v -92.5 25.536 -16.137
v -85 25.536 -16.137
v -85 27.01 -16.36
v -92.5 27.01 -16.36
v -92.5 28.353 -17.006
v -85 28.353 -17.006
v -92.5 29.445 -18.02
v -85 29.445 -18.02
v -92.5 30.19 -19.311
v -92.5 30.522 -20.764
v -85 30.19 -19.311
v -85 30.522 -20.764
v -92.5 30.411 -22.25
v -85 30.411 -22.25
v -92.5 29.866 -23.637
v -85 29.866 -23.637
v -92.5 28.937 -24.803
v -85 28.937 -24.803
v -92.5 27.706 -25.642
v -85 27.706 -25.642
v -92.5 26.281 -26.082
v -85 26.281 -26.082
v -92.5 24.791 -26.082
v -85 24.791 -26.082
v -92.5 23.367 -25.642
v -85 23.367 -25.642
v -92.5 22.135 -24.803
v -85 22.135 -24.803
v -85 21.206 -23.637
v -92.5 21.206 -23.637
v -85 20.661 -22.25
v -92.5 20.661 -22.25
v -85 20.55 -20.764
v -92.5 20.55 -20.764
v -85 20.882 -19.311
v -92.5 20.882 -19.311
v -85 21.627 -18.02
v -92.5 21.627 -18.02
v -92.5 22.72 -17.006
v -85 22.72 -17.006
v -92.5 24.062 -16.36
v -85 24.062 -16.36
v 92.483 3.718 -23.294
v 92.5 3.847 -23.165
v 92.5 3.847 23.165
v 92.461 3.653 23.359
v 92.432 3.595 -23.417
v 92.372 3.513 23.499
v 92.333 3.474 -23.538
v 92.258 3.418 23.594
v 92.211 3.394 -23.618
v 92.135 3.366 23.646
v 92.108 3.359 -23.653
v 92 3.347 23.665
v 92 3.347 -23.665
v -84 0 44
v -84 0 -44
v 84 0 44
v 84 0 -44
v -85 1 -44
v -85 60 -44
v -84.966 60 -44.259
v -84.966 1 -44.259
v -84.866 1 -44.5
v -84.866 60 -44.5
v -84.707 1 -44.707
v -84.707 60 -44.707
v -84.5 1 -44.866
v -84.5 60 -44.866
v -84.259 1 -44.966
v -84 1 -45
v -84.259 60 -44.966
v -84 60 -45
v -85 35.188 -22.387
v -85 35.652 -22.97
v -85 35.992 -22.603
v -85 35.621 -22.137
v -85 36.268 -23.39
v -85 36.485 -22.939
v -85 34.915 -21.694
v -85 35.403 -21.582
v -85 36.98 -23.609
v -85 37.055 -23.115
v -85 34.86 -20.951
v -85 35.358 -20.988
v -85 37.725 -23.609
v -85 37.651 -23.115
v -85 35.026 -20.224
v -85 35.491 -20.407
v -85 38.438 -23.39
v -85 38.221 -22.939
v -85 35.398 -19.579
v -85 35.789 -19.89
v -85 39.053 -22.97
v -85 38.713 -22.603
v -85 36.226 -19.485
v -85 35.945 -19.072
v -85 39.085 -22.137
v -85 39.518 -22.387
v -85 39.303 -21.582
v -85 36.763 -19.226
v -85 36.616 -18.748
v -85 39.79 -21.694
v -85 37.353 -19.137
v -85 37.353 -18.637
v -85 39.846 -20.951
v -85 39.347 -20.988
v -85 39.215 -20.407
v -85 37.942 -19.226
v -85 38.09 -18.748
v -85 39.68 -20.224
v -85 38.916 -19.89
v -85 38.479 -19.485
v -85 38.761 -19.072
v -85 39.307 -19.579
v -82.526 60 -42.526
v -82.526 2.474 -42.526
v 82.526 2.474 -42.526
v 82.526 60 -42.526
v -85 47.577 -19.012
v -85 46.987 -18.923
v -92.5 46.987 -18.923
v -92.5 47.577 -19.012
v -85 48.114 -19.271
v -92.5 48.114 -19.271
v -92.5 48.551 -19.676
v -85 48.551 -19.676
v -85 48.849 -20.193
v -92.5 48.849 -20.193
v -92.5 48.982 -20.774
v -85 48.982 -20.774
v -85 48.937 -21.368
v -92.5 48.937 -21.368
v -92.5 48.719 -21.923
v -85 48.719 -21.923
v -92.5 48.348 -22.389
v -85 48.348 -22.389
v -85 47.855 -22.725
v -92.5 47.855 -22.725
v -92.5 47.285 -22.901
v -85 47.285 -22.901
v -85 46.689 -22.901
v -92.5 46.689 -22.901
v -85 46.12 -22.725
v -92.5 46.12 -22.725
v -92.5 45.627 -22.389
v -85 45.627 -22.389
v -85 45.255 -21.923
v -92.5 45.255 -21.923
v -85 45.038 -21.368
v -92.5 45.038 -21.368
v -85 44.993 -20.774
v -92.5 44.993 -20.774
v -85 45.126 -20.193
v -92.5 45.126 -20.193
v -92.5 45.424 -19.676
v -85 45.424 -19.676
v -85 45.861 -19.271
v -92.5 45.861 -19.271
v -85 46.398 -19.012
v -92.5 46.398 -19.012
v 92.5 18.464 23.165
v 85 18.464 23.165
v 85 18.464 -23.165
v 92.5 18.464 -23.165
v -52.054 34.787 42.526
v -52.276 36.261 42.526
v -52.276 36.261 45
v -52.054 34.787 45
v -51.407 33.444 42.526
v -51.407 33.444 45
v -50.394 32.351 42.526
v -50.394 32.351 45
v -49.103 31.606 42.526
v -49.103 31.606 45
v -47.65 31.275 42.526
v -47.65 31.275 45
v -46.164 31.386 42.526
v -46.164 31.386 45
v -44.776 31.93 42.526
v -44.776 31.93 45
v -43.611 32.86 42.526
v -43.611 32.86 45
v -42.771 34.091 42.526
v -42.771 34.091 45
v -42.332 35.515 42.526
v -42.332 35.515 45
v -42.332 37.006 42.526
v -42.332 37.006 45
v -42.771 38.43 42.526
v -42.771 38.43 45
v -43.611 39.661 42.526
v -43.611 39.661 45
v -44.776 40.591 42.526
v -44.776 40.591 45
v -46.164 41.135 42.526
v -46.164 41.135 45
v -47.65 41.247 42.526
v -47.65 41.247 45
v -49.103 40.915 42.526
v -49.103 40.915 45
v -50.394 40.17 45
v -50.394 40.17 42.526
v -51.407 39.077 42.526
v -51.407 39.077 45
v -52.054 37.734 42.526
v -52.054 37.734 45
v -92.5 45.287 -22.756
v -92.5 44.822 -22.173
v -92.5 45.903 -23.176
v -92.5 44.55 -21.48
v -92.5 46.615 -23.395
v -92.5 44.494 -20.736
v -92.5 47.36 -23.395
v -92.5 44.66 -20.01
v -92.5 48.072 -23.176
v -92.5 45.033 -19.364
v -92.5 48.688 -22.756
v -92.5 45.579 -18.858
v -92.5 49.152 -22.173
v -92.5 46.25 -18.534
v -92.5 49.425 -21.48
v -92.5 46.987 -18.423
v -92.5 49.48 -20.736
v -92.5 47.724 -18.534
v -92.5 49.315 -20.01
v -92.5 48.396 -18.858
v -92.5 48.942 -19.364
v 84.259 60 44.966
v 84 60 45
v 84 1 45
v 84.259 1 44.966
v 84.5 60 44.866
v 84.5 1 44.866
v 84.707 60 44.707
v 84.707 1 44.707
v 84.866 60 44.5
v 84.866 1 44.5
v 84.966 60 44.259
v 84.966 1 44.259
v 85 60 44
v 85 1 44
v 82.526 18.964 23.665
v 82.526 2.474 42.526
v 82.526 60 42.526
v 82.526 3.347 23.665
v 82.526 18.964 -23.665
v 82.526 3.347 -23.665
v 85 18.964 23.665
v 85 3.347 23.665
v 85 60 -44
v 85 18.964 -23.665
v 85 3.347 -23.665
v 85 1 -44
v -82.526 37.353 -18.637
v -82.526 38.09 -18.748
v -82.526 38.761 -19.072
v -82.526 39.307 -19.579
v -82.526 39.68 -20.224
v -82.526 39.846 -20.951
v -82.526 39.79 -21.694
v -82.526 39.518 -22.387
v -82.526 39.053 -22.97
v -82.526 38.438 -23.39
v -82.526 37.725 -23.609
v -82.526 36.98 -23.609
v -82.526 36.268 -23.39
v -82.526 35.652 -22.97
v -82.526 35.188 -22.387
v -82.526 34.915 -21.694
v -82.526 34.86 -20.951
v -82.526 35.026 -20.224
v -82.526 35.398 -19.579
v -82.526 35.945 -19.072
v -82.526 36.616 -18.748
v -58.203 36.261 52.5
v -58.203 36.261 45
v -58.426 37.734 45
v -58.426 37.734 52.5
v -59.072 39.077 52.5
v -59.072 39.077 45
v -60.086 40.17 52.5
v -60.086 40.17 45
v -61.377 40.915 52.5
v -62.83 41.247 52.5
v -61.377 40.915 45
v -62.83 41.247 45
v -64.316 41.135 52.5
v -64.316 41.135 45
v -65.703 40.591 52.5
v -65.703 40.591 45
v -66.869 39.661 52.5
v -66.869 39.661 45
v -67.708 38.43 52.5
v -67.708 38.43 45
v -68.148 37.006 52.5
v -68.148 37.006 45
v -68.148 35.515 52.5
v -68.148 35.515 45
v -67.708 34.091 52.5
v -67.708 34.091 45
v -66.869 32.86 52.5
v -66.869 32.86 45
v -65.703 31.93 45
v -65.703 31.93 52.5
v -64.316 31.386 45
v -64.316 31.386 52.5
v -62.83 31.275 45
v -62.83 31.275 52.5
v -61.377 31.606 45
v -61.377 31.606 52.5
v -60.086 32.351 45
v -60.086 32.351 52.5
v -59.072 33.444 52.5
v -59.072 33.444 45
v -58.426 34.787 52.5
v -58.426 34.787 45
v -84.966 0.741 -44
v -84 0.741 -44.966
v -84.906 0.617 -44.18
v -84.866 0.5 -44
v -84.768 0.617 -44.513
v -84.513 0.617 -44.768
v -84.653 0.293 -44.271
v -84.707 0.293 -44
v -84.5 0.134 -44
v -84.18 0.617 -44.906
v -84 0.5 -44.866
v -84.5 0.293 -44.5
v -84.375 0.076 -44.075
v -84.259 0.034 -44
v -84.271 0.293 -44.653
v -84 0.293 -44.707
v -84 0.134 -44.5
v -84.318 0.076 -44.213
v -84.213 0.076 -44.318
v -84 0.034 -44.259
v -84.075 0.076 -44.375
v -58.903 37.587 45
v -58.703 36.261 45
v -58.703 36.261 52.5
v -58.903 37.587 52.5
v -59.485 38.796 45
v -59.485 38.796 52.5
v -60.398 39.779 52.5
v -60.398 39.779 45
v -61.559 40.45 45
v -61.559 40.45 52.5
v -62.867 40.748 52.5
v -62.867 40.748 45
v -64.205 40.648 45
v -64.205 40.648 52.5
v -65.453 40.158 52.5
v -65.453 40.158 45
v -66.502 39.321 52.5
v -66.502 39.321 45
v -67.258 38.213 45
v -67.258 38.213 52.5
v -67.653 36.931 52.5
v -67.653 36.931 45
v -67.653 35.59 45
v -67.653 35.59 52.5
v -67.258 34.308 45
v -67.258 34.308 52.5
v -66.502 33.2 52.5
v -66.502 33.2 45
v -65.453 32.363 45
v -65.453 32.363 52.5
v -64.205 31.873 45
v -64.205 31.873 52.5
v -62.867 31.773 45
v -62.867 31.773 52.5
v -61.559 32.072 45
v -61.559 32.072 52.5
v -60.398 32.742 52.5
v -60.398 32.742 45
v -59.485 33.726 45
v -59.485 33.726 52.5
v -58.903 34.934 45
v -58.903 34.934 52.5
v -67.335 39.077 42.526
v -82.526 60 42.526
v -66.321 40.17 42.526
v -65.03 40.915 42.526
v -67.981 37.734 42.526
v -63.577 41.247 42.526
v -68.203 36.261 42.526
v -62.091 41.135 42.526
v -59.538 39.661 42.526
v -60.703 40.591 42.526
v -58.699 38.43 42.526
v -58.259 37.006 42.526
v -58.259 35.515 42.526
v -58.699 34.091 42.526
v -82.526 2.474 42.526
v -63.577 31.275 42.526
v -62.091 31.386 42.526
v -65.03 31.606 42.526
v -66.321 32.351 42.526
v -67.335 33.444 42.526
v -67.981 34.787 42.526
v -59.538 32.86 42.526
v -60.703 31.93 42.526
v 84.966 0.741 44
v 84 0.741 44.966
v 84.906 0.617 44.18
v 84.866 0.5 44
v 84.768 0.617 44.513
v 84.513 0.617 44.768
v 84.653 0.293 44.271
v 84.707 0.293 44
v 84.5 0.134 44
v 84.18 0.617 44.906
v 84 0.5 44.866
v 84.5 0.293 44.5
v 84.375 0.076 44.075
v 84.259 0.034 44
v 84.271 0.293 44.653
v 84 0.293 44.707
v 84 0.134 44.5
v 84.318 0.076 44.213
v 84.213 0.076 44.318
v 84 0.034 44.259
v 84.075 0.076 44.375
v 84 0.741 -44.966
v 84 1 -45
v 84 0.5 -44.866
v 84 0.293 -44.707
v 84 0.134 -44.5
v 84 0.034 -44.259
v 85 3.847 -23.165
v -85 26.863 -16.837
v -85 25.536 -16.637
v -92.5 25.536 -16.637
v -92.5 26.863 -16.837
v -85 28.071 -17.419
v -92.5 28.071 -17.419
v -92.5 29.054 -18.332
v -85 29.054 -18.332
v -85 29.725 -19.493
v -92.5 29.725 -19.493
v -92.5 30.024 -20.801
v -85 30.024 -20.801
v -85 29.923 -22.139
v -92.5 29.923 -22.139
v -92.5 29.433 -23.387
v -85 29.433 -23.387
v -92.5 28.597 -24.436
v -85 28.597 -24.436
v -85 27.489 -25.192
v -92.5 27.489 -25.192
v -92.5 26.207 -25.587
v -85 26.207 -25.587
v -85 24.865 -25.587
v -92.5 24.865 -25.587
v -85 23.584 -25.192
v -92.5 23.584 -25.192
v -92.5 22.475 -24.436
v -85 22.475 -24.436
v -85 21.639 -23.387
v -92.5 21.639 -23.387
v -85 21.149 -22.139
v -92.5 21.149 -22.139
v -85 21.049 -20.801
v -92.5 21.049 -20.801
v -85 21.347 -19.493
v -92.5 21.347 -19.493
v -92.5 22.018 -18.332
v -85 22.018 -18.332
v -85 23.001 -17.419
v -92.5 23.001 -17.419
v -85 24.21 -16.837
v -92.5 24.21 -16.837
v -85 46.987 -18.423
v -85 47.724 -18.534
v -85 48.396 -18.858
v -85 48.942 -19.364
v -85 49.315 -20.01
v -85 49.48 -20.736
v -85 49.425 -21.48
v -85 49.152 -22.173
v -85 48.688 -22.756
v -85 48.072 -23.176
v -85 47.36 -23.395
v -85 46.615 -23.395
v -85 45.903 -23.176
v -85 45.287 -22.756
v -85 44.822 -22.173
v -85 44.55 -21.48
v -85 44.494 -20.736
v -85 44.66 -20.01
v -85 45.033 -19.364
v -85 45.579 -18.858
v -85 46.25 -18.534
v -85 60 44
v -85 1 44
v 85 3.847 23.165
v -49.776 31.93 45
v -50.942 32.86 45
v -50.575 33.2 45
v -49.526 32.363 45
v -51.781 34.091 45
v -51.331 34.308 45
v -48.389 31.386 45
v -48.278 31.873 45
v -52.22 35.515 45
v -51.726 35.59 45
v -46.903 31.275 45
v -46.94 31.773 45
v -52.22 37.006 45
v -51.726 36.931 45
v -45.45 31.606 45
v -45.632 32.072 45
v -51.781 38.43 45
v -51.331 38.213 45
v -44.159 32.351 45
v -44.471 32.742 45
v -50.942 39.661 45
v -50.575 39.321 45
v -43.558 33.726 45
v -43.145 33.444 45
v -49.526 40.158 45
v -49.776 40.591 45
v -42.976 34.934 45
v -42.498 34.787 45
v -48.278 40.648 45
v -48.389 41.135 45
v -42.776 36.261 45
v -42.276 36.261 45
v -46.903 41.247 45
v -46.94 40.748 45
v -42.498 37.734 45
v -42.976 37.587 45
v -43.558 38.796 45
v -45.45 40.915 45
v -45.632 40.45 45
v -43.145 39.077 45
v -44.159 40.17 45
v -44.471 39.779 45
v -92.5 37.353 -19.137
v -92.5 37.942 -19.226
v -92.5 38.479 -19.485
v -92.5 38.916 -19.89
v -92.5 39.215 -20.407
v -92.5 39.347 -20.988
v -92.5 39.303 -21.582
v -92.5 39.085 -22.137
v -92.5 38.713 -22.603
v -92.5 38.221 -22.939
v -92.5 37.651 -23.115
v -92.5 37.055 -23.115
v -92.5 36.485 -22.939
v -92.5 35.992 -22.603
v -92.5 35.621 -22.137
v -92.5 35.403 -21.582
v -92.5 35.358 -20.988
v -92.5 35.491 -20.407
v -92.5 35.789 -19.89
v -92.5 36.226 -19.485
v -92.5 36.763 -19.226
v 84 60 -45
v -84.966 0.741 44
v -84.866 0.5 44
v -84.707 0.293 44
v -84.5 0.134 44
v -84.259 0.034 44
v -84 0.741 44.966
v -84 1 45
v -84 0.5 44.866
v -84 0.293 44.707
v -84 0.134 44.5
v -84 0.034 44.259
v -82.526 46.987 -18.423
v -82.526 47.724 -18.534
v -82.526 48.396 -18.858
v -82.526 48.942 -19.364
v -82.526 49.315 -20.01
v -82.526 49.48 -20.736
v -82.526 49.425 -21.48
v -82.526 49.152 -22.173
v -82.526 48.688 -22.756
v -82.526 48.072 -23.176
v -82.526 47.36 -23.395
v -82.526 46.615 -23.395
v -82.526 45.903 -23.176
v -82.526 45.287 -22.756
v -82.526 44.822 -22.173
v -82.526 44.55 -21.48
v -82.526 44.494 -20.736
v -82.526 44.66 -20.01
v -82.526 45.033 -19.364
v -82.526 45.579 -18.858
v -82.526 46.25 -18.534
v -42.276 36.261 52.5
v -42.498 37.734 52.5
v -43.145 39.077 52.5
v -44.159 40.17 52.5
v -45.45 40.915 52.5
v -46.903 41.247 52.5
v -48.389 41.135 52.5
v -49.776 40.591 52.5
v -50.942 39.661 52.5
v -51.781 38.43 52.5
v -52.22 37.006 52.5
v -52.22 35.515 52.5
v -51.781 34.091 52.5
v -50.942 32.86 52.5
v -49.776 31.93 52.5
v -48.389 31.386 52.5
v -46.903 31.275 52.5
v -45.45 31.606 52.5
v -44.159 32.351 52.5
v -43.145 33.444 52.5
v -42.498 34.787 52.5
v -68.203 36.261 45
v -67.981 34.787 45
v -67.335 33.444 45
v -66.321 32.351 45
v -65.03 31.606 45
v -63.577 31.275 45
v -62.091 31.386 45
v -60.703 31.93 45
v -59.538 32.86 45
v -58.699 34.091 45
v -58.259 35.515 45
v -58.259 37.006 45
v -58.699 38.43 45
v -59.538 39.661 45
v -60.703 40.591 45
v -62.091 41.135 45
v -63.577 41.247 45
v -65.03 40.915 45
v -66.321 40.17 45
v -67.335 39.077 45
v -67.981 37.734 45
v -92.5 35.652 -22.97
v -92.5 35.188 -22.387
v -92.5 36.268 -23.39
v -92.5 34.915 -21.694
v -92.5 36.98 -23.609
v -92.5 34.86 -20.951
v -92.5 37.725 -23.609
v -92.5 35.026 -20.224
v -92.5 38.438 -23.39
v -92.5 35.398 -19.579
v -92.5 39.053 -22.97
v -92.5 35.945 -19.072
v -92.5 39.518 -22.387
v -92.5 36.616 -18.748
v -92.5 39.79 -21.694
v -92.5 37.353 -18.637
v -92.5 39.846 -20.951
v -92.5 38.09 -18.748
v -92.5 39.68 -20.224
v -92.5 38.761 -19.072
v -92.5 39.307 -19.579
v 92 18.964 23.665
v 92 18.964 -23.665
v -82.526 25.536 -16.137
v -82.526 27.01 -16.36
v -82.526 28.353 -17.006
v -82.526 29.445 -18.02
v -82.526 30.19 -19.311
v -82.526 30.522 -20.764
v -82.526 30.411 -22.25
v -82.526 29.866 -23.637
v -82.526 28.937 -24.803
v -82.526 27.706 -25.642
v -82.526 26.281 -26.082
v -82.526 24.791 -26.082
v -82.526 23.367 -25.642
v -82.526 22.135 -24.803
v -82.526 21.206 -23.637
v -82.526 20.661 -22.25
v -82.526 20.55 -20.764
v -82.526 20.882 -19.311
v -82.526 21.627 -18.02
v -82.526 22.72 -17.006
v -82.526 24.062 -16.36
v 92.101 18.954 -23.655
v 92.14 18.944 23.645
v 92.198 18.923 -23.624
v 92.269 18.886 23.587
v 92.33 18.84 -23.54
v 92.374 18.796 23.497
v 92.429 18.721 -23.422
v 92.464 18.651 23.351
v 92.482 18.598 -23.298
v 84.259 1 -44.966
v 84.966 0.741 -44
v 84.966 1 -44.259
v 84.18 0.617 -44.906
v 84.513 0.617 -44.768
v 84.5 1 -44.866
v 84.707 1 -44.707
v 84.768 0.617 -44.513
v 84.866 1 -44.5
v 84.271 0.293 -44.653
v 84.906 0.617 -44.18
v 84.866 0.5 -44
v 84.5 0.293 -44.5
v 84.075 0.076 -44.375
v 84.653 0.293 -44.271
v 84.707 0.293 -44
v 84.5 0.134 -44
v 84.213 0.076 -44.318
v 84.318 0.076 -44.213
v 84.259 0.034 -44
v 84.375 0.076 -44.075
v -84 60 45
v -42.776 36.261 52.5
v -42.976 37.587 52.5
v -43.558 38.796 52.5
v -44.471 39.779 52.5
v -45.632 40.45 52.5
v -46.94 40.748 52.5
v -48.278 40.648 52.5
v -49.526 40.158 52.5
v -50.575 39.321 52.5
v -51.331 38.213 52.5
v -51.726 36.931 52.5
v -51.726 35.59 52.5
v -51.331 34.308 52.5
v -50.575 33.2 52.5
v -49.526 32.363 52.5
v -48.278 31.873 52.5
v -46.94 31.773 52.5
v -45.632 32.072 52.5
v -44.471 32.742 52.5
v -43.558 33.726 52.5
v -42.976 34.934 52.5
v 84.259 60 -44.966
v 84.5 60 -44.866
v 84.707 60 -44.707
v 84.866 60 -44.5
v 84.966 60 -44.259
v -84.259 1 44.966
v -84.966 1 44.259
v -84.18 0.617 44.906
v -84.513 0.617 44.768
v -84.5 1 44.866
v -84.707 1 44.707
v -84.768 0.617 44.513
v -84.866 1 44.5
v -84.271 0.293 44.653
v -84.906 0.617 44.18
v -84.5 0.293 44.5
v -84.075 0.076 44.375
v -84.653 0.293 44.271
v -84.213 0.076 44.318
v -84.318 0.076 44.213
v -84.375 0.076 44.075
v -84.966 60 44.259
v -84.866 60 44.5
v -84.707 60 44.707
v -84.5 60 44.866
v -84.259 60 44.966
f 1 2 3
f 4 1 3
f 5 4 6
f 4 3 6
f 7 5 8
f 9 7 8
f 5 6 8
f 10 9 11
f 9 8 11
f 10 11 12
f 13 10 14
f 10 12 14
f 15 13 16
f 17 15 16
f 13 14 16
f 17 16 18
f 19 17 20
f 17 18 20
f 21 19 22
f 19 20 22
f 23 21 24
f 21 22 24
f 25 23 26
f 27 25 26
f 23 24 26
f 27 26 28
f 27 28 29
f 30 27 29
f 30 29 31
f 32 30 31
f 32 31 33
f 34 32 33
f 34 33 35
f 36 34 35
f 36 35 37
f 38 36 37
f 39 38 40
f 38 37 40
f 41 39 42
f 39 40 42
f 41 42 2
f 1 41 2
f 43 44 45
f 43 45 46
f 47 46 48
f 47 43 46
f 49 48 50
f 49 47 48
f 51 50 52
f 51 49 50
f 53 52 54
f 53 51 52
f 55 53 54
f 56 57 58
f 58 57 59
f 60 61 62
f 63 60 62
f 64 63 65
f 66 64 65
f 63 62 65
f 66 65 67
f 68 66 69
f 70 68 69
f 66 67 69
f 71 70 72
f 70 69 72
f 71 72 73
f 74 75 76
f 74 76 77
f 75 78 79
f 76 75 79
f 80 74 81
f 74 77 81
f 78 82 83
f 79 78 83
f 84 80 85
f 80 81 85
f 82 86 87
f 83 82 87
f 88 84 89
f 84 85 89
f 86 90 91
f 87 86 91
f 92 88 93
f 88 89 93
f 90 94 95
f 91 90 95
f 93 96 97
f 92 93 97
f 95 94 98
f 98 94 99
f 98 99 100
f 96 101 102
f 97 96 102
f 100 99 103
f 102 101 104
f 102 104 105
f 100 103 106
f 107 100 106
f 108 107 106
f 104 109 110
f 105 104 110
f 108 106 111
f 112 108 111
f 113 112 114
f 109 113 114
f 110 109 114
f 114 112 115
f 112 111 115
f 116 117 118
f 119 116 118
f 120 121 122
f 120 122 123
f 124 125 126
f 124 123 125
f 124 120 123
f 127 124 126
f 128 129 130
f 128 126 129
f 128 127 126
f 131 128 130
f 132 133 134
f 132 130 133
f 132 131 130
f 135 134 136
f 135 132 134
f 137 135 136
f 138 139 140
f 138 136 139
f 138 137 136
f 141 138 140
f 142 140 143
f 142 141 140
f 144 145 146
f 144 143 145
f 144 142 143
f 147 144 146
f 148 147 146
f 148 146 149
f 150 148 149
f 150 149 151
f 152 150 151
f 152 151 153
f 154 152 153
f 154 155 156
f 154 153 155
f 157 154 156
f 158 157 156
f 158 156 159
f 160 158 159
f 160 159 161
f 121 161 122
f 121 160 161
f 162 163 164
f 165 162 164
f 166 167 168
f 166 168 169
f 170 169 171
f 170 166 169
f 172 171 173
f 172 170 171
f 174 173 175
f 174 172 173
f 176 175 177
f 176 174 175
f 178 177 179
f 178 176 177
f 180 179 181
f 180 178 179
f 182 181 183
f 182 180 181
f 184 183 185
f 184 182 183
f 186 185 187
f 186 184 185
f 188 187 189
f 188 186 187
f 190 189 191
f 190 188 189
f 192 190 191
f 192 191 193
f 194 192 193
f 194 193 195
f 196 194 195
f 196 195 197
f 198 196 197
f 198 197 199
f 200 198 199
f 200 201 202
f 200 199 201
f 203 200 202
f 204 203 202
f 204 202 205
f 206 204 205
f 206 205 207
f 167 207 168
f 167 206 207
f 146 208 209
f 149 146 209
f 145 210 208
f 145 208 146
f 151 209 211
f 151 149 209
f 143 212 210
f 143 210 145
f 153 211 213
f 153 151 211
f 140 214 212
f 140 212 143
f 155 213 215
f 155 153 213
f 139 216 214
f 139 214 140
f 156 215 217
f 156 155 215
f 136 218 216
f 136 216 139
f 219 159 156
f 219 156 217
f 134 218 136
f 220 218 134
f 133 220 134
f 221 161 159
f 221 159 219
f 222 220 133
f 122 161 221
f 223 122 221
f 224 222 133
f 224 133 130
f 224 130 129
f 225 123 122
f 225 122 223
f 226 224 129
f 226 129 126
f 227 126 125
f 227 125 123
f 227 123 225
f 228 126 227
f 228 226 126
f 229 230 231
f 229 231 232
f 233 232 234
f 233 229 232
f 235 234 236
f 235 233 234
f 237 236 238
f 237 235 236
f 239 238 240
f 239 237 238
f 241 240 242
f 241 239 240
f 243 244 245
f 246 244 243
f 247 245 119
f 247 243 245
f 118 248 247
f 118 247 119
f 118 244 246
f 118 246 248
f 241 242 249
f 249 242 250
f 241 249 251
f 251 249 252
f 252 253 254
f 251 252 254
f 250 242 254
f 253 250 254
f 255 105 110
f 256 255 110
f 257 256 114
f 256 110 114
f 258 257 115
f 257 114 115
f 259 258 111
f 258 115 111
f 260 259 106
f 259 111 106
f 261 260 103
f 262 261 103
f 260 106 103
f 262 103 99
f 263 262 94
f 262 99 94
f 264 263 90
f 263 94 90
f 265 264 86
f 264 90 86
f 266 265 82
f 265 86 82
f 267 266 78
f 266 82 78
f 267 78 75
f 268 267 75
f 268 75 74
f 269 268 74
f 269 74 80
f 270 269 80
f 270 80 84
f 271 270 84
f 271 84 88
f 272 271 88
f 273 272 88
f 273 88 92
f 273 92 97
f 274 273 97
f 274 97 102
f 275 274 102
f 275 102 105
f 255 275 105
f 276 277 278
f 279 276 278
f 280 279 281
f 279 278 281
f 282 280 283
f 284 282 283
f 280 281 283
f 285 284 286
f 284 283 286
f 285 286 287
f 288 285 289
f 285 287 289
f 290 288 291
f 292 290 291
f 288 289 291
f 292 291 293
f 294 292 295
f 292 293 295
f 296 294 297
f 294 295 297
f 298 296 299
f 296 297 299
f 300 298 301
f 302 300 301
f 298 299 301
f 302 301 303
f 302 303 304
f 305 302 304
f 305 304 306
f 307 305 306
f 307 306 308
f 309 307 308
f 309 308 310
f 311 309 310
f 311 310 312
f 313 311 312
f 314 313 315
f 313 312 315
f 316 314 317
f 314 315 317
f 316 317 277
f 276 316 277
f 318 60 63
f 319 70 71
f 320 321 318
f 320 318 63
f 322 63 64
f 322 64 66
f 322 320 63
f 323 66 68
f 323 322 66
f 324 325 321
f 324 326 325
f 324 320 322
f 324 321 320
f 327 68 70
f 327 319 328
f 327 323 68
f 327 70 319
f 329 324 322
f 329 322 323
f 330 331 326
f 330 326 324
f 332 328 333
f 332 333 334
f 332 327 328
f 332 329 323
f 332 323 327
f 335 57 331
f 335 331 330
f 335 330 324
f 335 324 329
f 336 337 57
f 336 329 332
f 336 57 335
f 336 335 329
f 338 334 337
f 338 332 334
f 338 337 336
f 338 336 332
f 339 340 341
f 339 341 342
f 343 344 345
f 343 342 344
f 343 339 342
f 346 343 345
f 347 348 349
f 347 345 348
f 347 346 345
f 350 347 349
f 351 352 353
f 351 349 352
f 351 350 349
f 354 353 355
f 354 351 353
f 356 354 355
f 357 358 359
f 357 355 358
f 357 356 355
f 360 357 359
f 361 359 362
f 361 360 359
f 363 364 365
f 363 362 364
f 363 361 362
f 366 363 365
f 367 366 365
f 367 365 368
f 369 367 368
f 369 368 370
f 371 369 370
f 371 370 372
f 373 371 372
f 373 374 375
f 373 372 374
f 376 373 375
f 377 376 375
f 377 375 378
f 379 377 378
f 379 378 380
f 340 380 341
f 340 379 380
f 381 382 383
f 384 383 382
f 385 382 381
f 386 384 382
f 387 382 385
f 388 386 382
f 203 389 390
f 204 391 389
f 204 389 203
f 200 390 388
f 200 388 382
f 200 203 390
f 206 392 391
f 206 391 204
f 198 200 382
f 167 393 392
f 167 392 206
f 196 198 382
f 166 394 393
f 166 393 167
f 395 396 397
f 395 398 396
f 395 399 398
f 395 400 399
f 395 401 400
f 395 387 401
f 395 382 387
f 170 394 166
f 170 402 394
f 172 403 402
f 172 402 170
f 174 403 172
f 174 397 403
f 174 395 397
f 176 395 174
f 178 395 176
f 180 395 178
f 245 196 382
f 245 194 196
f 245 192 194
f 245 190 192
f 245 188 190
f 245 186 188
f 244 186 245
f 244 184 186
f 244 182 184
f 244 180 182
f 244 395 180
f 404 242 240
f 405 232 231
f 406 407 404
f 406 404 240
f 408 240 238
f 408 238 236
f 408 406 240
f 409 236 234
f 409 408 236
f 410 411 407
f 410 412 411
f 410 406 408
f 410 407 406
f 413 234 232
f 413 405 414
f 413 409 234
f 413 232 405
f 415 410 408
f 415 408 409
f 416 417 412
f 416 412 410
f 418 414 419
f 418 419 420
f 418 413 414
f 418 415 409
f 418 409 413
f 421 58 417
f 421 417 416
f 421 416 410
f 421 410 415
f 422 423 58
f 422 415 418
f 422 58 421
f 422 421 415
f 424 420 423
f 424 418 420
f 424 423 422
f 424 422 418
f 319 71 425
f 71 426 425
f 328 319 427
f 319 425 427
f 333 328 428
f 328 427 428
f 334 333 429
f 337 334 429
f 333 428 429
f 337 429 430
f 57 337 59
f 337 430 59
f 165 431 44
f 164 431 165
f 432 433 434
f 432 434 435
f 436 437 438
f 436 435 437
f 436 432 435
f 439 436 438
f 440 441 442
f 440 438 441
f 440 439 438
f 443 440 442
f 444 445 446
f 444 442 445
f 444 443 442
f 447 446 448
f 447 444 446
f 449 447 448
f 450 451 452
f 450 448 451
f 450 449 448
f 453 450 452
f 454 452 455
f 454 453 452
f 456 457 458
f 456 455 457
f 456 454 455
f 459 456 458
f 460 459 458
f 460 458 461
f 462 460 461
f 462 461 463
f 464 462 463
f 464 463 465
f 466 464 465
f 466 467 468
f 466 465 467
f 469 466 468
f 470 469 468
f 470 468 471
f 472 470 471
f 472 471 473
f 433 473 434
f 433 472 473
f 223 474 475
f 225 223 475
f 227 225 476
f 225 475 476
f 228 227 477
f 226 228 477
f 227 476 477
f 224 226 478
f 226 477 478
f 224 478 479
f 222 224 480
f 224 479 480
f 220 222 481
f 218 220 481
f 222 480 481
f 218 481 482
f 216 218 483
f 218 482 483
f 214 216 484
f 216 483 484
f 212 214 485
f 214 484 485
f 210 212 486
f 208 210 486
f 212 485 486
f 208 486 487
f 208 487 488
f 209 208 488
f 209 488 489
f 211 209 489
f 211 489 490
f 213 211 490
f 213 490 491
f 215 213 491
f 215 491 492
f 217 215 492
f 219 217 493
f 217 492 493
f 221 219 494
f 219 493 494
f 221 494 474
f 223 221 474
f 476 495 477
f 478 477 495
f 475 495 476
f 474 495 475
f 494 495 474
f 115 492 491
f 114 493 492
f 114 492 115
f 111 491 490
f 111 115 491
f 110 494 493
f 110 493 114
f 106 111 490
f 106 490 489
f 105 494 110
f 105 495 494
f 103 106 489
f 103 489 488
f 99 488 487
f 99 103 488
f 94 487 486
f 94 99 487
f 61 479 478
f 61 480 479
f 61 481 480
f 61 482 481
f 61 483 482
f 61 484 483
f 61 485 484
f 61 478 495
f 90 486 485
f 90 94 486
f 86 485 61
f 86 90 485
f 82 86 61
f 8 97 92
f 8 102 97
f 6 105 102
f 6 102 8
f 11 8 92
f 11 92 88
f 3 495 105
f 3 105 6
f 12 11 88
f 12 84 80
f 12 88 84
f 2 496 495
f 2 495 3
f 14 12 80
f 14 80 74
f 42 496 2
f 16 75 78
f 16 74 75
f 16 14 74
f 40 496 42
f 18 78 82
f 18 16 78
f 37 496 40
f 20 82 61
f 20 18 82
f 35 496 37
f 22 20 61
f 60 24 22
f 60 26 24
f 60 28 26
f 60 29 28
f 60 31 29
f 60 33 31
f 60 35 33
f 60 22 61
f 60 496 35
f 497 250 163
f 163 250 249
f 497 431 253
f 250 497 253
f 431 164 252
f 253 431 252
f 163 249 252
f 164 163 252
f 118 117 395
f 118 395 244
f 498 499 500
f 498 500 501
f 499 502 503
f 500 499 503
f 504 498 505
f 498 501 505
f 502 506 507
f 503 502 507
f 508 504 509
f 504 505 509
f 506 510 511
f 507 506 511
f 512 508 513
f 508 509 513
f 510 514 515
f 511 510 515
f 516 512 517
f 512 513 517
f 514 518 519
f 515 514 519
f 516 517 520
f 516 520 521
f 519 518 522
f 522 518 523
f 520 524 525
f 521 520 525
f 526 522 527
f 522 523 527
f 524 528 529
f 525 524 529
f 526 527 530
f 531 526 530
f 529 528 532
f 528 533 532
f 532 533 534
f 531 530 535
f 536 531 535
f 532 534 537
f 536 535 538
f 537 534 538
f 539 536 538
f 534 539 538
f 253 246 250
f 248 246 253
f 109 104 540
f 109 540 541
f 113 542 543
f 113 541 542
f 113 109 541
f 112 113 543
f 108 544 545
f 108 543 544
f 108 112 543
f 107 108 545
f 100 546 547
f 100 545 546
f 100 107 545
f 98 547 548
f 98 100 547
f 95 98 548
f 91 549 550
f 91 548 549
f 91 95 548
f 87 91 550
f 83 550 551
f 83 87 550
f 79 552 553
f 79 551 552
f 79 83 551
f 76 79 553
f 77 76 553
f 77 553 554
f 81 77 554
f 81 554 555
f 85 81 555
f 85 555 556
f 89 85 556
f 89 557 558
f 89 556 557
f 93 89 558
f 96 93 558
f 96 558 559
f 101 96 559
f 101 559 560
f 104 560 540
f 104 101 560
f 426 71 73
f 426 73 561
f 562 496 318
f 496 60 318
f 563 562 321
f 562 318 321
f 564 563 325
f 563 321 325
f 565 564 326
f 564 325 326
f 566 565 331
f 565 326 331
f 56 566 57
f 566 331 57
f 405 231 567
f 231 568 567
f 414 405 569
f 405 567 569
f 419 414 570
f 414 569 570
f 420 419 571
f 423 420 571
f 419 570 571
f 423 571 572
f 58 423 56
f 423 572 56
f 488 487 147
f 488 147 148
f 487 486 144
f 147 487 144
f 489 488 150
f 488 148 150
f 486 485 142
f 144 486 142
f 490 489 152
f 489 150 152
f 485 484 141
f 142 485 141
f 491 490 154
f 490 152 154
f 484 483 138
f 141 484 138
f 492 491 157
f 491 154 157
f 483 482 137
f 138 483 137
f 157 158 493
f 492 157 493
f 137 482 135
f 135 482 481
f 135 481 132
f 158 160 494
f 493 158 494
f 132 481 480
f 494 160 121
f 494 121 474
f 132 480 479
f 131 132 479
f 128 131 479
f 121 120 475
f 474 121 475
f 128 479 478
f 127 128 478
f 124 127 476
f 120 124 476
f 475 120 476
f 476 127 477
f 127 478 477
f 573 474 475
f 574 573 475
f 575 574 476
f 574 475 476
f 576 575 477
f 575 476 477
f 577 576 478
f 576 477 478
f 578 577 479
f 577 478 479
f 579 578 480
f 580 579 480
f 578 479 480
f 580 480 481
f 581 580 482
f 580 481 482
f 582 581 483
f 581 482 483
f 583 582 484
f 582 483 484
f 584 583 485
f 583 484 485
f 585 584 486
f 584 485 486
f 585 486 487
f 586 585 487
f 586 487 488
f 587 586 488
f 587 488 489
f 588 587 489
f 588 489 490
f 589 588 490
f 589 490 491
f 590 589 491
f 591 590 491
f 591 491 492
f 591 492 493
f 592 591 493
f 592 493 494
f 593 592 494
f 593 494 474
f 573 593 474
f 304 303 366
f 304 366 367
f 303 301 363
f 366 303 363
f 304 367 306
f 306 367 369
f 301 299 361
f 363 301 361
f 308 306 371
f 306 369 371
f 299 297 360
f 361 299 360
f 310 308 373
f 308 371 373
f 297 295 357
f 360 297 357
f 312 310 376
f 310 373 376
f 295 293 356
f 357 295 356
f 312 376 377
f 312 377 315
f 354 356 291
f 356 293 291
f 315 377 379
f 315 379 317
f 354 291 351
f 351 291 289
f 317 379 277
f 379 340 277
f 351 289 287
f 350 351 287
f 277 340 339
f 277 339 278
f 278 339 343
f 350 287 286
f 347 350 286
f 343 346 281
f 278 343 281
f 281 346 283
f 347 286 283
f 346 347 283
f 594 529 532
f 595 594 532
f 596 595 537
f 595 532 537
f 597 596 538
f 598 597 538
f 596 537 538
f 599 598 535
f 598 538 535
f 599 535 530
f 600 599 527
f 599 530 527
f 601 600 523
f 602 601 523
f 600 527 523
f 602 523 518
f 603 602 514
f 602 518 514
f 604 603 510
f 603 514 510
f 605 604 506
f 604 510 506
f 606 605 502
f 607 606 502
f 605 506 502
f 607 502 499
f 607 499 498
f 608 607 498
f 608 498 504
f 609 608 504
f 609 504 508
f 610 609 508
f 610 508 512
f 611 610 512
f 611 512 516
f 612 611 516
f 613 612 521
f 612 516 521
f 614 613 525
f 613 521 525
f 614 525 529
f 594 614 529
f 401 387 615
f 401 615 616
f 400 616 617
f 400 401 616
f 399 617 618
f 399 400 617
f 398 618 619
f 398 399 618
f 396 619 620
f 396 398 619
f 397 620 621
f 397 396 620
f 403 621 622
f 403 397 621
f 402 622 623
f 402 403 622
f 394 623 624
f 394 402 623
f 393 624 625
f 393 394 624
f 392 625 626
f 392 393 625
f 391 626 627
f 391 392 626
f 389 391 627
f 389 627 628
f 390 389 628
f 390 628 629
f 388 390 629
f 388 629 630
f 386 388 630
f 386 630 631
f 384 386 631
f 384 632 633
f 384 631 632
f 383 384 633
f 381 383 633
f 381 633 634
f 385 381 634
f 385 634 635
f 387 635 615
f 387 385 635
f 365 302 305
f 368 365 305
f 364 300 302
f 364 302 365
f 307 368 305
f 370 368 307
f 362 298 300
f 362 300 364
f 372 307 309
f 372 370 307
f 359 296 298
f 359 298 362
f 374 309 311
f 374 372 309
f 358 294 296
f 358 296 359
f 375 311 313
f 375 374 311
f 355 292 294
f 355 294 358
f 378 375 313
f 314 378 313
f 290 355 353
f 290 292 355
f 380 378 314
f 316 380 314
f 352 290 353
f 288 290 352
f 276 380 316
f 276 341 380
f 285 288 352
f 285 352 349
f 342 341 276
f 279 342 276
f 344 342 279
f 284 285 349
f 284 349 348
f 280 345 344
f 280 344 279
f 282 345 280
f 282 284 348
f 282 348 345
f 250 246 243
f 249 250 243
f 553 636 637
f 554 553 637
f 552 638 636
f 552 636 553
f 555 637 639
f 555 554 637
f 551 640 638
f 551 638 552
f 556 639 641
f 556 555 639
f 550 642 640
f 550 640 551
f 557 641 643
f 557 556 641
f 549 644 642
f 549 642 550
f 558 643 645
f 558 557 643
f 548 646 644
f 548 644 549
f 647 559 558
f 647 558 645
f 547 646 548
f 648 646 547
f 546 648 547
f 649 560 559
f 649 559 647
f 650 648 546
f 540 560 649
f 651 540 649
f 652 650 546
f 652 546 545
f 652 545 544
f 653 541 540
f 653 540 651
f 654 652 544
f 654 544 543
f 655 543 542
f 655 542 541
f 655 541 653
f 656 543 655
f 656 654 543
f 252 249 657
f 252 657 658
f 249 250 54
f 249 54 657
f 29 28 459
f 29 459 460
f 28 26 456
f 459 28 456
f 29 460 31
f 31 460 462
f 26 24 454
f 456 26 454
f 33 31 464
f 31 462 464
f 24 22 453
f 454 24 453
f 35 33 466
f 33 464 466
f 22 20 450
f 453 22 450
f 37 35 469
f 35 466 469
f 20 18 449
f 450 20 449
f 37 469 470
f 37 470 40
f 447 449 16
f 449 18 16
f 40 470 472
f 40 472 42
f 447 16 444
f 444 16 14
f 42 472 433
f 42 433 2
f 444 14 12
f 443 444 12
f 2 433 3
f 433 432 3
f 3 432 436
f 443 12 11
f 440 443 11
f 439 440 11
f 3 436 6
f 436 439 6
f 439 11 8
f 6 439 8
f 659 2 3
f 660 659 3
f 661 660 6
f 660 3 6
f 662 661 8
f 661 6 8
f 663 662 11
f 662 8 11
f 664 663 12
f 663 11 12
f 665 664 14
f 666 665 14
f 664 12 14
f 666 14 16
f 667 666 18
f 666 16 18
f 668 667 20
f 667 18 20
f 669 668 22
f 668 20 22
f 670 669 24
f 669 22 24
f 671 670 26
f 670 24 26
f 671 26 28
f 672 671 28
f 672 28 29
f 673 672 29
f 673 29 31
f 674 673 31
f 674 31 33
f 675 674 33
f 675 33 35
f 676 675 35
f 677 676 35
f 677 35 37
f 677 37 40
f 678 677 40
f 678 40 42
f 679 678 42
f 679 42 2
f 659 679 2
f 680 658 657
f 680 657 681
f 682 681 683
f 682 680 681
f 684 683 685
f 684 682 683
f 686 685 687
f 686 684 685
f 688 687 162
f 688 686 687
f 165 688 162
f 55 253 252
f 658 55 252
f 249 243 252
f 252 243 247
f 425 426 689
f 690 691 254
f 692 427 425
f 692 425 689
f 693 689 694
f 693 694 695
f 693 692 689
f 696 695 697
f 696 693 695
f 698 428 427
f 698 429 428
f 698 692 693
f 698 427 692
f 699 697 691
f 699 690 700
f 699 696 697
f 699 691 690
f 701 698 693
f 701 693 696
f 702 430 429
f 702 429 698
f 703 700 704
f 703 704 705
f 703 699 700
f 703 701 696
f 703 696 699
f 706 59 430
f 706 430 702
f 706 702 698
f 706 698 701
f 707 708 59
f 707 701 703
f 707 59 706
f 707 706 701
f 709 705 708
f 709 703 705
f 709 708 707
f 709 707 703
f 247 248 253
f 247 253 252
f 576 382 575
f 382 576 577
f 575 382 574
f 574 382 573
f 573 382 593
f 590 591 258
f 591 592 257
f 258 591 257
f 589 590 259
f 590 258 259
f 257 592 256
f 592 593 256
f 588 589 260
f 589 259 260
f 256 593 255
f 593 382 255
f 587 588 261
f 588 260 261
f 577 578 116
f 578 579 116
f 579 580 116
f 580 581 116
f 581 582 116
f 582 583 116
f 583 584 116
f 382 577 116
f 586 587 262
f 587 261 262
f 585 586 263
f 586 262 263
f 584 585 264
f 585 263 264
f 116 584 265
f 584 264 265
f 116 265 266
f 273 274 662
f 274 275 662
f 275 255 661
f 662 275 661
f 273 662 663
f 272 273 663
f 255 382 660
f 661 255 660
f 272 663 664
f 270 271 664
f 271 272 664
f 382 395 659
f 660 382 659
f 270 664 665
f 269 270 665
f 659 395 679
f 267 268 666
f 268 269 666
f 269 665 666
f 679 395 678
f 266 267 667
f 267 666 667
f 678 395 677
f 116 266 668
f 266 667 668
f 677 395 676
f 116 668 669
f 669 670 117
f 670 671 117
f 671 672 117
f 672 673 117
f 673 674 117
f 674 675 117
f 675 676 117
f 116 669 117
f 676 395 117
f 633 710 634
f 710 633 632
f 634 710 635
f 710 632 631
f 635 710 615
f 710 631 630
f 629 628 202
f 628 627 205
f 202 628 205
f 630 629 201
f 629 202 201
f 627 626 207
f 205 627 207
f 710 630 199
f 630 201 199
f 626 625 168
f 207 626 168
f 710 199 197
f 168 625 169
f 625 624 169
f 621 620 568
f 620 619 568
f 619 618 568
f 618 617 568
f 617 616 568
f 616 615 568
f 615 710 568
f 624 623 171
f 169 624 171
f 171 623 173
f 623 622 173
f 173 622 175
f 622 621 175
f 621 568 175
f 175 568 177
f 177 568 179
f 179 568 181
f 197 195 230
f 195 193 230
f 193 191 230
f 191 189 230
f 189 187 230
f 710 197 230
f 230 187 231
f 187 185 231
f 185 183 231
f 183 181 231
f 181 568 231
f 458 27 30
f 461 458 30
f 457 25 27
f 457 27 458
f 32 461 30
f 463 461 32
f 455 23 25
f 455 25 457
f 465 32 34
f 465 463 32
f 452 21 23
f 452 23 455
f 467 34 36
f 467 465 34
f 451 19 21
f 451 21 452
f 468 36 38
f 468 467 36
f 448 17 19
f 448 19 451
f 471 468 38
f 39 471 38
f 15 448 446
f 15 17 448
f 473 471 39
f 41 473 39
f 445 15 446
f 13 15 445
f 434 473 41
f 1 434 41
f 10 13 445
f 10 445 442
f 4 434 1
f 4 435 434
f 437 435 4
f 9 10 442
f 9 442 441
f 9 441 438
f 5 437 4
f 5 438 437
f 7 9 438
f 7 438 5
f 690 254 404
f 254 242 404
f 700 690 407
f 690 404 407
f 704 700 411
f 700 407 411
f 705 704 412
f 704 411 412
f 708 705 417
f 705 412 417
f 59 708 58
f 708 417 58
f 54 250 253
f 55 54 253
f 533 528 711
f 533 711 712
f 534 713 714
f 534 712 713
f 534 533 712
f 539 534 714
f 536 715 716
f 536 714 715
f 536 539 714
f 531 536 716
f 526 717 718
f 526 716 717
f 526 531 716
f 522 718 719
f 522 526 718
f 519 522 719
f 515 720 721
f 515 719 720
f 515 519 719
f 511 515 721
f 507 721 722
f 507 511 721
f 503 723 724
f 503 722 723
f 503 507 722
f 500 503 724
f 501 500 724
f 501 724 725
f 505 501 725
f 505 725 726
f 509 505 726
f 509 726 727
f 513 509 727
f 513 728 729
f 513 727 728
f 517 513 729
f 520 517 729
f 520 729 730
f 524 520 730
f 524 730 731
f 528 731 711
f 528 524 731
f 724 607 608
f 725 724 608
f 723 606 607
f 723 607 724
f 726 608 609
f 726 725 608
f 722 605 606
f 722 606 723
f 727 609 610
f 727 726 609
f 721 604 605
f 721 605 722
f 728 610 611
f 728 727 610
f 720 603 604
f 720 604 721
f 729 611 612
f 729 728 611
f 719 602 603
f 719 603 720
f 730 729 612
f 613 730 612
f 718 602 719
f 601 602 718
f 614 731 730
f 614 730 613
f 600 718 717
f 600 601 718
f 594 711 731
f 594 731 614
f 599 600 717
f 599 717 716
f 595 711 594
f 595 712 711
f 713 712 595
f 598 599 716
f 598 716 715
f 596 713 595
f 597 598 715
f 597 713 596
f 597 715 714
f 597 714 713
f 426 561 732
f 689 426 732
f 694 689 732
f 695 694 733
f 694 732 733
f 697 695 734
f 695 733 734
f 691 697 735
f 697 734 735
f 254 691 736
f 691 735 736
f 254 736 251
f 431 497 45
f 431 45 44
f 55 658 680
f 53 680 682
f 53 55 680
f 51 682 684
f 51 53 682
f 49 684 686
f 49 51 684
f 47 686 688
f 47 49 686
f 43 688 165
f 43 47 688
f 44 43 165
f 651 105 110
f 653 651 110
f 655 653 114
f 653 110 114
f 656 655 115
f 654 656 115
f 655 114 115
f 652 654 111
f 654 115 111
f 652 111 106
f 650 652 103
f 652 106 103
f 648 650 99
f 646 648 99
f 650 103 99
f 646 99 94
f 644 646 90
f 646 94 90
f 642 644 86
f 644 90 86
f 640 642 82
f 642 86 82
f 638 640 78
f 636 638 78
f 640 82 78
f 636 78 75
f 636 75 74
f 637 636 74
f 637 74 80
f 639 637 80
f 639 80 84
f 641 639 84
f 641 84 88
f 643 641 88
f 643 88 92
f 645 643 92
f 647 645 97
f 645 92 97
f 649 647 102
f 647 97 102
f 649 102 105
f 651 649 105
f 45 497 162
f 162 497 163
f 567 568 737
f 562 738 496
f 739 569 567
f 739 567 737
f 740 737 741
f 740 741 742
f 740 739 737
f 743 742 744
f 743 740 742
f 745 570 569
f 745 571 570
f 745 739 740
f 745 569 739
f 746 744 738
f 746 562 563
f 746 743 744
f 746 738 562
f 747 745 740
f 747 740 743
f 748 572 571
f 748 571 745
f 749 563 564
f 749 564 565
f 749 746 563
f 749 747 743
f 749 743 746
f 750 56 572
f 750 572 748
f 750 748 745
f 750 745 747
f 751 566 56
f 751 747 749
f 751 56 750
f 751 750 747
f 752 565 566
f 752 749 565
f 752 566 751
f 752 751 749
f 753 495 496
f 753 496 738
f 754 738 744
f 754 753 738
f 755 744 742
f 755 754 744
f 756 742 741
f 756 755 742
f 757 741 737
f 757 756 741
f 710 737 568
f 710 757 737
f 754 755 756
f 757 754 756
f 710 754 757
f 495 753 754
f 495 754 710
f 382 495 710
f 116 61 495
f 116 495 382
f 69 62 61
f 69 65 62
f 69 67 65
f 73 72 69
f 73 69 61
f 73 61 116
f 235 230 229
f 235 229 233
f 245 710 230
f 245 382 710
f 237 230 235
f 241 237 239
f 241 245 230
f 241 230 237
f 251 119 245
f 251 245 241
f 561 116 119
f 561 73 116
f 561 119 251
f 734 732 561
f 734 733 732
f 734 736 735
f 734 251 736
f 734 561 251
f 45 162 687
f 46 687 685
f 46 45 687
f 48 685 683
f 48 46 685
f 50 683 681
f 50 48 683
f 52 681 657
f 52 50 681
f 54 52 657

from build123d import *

# Parameters (mm, degrees)
SKETCH1_W             = 170
SKETCH1_H             = 90
BOSS_EXTRUDE2_DEPTH   = 60
SHELL2_T              = -2.473839036
SKETCH4_W             = 47.329999632
SKETCH4_H             = 15.617306276
CUT_EXTRUDE3_DEPTH    = 95
SKETCH5_R             = 5
CUT_EXTRUDE4_DEPTH    = 82.49790304
SKETCH11_R            = 2.5
CUT_EXTRUDE5_DEPTH    = 10
SKETCH12_R            = 2.5
CUT_EXTRUDE6_DEPTH    = 10
SKETCH13_R            = 5
CUT_EXTRUDE7_DEPTH    = 10
SKETCH18_R            = 2.5
BOSS_EXTRUDE4_DEPTH   = 7.5
SHELL5_T              = -0.5
SKETCH19_R            = 2.5
BOSS_EXTRUDE5_DEPTH   = 7.5
SHELL6_T              = -0.5
SKETCH20_R            = 5
BOSS_EXTRUDE6_DEPTH   = 7.5
SHELL7_T              = -0.5
SKETCH21_R            = 5
BOSS_EXTRUDE7_DEPTH   = 7.5
BOSS_EXTRUDE7_2_DEPTH = 7.5
SHELL8_T              = -0.5
SHELL9_T              = -0.5
SKETCH23_W            = 47.329999632
SKETCH23_H            = 15.617306276
BOSS_EXTRUDE8_DEPTH   = 7.5
SHELL10_T             = -0.5
FILLET1_START         = 2
FILLET1_DEPTH         = 18
FILLET1_START_2       = -25
FILLET1_2_DEPTH       = 50
FILLET3_R             = 1
FILLET4_R             = 1


with BuildPart() as part:
    # Sketch1 → Boss-Extrude2 (new body)
    with BuildSketch(Plane(origin=(0, 0, 0), x_dir=(1, 0, 0), z_dir=(0, 1, 0))):
        Rectangle(SKETCH1_W, SKETCH1_H)
    extrude(amount=BOSS_EXTRUDE2_DEPTH)

    # Shell2
    shell2_openings = [part.faces().sort_by_distance(p)[0] for p in [
        (0, 60, 0),
    ]]
    offset(amount=SHELL2_T, openings=shell2_openings, kind=Kind.INTERSECTION)

    # Sketch4 → Cut-Extrude3 (cut)
    with BuildSketch(Plane(origin=(0, 0, 0), x_dir=(0, 0, -1), z_dir=(1, 0, 0))):
        with Locations((0, 11.155648294)):
            Rectangle(SKETCH4_W, SKETCH4_H)
    extrude(amount=CUT_EXTRUDE3_DEPTH, mode=Mode.SUBTRACT)

    # Sketch5 → Cut-Extrude4 (cut)
    with BuildSketch(Plane.XY):
        with Locations(Location((-63.203440073, 36.260575633, 0), (0, 0, 180))):
            Circle(SKETCH5_R)
        with Locations(Location((-47.276275906, 36.260575633, 0), (0, 0, 180))):
            Circle(SKETCH5_R)
    extrude(amount=CUT_EXTRUDE4_DEPTH, mode=Mode.SUBTRACT)

    # Sketch11 → Cut-Extrude5 (cut)
    with BuildSketch(Plane.ZY.offset(85)):
        with Locations((-20.923207268, 46.987362625)):
            Circle(SKETCH11_R)
    extrude(amount=-CUT_EXTRUDE5_DEPTH, mode=Mode.SUBTRACT)

    # Sketch12 → Cut-Extrude6 (cut)
    with BuildSketch(Plane.ZY.offset(85)):
        with Locations((-21.137371962, 37.352812096)):
            Circle(SKETCH12_R)
    extrude(amount=-CUT_EXTRUDE6_DEPTH, mode=Mode.SUBTRACT)

    # Sketch13 → Cut-Extrude7 (cut)
    with BuildSketch(Plane.ZY.offset(85)):
        with Locations((-21.137371962, 25.536121377)):
            Circle(SKETCH13_R)
    extrude(amount=-CUT_EXTRUDE7_DEPTH, mode=Mode.SUBTRACT)

    # Fillet3
    fillet3_edges = [part.edges().sort_by_distance(p)[0] for p in [
        (85, 30, 45),
        (-85, 30, 45),
        (-85, 30, -45),
        (85, 30, -45),
    ]]
    fillet(fillet3_edges, radius=FILLET3_R)

    # Fillet4
    fillet4_edges = [part.edges().sort_by_distance(p)[0] for p in [
        (-85, 0, 0),
        (85, 0, 0),
        (0, 0, 45),
        (0, 0, -45),
        (84.707106781, 0, 44.707106781),
        (-84.707106781, 0, 44.707106781),
        (84.707106781, 0, -44.707106781),
        (-84.707106781, 0, -44.707106781),
    ]]
    fillet(fillet4_edges, radius=FILLET4_R)


with BuildPart() as body_2:
    # Sketch18 → Boss-Extrude4 (new body)
    with BuildSketch(Plane.ZY.offset(85)):
        with Locations((-20.923207268, 46.987362625)):
            Circle(SKETCH18_R)
    extrude(amount=BOSS_EXTRUDE4_DEPTH)

    # Shell5
    shell5_openings = [body_2.faces().sort_by_distance(p)[0] for p in [
        (-92.5, 46.987362625, -20.923207268),
        (-85, 46.987362625, -20.923207268),
    ]]
    offset(amount=SHELL5_T, openings=shell5_openings, kind=Kind.INTERSECTION)


with BuildPart() as body_3:
    # Sketch19 → Boss-Extrude5 (new body)
    with BuildSketch(Plane.ZY.offset(85)):
        with Locations((-21.137371962, 37.352812096)):
            Circle(SKETCH19_R)
    extrude(amount=BOSS_EXTRUDE5_DEPTH)

    # Shell6
    shell6_openings = [body_3.faces().sort_by_distance(p)[0] for p in [
        (-92.5, 37.352812096, -21.137371962),
        (-85, 37.352812096, -21.137371962),
    ]]
    offset(amount=SHELL6_T, openings=shell6_openings, kind=Kind.INTERSECTION)


with BuildPart() as body_4:
    # Sketch20 → Boss-Extrude6 (new body)
    with BuildSketch(Plane.ZY.offset(85)):
        with Locations((-21.137371962, 25.536121377)):
            Circle(SKETCH20_R)
    extrude(amount=BOSS_EXTRUDE6_DEPTH)

    # Shell7
    shell7_openings = [body_4.faces().sort_by_distance(p)[0] for p in [
        (-92.5, 25.536121377, -21.137371962),
        (-85, 25.536121377, -21.137371962),
    ]]
    offset(amount=SHELL7_T, openings=shell7_openings, kind=Kind.INTERSECTION)


with BuildPart() as body_5:
    # Sketch21 → Boss-Extrude7 (new body)
    with BuildSketch(Plane.XY.offset(45)):
        with Locations((-63.203440073, 36.260575633)):
            Circle(SKETCH21_R)
    extrude(amount=BOSS_EXTRUDE7_DEPTH)

    # Shell8
    shell8_openings = [body_5.faces().sort_by_distance(p)[0] for p in [
        (-63.203440073, 36.260575633, 52.5),
        (-63.203440073, 36.260575633, 45),
    ]]
    offset(amount=SHELL8_T, openings=shell8_openings, kind=Kind.INTERSECTION)


with BuildPart() as body_6:
    # Sketch21 → Boss-Extrude7 2 (new body)
    with BuildSketch(Plane.XY.offset(45)):
        with Locations((-47.276275906, 36.260575633)):
            Circle(SKETCH21_R)
    extrude(amount=BOSS_EXTRUDE7_2_DEPTH)

    # Shell9
    shell9_openings = [body_6.faces().sort_by_distance(p)[0] for p in [
        (-47.276275906, 36.260575633, 52.5),
        (-47.276275906, 36.260575633, 45),
    ]]
    offset(amount=SHELL9_T, openings=shell9_openings, kind=Kind.INTERSECTION)


with BuildPart() as body_7:
    # Sketch23 → Boss-Extrude8 (new body)
    with BuildSketch(Plane(origin=(85, 0, 0), x_dir=(0, 0, -1), z_dir=(1, 0, 0))):
        with Locations((0, 11.155648294)):
            Rectangle(SKETCH23_W, SKETCH23_H)
    extrude(amount=BOSS_EXTRUDE8_DEPTH)

    # Shell10
    shell10_openings = [body_7.faces().sort_by_distance(p)[0] for p in [
        (92.5, 11.155648294, 0),
        (85, 11.155648294, 0),
    ]]
    offset(amount=SHELL10_T, openings=shell10_openings, kind=Kind.INTERSECTION)

    # Fillet1: read off the stored shape, not the designer's step
    # Fillet1 outline → Fillet1 (cut)
    with BuildSketch(Plane(origin=(0, 0, 0), x_dir=(1, 0, 0), z_dir=(0, 1, 0)).offset(FILLET1_START)):
        with BuildLine():
            ThreePointArc((92, 23.664999816), (92.353553391, 23.518553207), (92.5, 23.164999816))
            Line((92.5, 23.164999816), (92.5, 23.664999816))
            Line((92.5, 23.664999816), (92, 23.664999816))
        make_face()
        with BuildLine():
            ThreePointArc((92.5, -23.164999816), (92.353553391, -23.518553207), (92, -23.664999816))
            Line((92, -23.664999816), (92.5, -23.664999816))
            Line((92.5, -23.664999816), (92.5, -23.164999816))
        make_face()
    extrude(amount=FILLET1_DEPTH, mode=Mode.SUBTRACT)

    # Fillet1 2 outline → Fillet1 2 (cut)
    with BuildSketch(Plane.XY.offset(FILLET1_START_2)):
        with BuildLine():
            ThreePointArc((92.5, 3.846995156), (92.35355339, 3.493441765), (92, 3.346995156))
            Line((92, 3.346995156), (92.5, 3.346995156))
            Line((92.5, 3.346995156), (92.5, 3.846995156))
        make_face()
        with BuildLine():
            Line((92.5, 18.964301432), (92, 18.964301432))
            ThreePointArc((92, 18.964301432), (92.353553391, 18.817854823), (92.5, 18.464301432))
            Line((92.5, 18.464301432), (92.5, 18.964301432))
        make_face()
    extrude(amount=FILLET1_2_DEPTH, mode=Mode.SUBTRACT)


solid = Compound([part.part, body_2.part, body_3.part, body_4.part, body_5.part, body_6.part, body_7.part])
